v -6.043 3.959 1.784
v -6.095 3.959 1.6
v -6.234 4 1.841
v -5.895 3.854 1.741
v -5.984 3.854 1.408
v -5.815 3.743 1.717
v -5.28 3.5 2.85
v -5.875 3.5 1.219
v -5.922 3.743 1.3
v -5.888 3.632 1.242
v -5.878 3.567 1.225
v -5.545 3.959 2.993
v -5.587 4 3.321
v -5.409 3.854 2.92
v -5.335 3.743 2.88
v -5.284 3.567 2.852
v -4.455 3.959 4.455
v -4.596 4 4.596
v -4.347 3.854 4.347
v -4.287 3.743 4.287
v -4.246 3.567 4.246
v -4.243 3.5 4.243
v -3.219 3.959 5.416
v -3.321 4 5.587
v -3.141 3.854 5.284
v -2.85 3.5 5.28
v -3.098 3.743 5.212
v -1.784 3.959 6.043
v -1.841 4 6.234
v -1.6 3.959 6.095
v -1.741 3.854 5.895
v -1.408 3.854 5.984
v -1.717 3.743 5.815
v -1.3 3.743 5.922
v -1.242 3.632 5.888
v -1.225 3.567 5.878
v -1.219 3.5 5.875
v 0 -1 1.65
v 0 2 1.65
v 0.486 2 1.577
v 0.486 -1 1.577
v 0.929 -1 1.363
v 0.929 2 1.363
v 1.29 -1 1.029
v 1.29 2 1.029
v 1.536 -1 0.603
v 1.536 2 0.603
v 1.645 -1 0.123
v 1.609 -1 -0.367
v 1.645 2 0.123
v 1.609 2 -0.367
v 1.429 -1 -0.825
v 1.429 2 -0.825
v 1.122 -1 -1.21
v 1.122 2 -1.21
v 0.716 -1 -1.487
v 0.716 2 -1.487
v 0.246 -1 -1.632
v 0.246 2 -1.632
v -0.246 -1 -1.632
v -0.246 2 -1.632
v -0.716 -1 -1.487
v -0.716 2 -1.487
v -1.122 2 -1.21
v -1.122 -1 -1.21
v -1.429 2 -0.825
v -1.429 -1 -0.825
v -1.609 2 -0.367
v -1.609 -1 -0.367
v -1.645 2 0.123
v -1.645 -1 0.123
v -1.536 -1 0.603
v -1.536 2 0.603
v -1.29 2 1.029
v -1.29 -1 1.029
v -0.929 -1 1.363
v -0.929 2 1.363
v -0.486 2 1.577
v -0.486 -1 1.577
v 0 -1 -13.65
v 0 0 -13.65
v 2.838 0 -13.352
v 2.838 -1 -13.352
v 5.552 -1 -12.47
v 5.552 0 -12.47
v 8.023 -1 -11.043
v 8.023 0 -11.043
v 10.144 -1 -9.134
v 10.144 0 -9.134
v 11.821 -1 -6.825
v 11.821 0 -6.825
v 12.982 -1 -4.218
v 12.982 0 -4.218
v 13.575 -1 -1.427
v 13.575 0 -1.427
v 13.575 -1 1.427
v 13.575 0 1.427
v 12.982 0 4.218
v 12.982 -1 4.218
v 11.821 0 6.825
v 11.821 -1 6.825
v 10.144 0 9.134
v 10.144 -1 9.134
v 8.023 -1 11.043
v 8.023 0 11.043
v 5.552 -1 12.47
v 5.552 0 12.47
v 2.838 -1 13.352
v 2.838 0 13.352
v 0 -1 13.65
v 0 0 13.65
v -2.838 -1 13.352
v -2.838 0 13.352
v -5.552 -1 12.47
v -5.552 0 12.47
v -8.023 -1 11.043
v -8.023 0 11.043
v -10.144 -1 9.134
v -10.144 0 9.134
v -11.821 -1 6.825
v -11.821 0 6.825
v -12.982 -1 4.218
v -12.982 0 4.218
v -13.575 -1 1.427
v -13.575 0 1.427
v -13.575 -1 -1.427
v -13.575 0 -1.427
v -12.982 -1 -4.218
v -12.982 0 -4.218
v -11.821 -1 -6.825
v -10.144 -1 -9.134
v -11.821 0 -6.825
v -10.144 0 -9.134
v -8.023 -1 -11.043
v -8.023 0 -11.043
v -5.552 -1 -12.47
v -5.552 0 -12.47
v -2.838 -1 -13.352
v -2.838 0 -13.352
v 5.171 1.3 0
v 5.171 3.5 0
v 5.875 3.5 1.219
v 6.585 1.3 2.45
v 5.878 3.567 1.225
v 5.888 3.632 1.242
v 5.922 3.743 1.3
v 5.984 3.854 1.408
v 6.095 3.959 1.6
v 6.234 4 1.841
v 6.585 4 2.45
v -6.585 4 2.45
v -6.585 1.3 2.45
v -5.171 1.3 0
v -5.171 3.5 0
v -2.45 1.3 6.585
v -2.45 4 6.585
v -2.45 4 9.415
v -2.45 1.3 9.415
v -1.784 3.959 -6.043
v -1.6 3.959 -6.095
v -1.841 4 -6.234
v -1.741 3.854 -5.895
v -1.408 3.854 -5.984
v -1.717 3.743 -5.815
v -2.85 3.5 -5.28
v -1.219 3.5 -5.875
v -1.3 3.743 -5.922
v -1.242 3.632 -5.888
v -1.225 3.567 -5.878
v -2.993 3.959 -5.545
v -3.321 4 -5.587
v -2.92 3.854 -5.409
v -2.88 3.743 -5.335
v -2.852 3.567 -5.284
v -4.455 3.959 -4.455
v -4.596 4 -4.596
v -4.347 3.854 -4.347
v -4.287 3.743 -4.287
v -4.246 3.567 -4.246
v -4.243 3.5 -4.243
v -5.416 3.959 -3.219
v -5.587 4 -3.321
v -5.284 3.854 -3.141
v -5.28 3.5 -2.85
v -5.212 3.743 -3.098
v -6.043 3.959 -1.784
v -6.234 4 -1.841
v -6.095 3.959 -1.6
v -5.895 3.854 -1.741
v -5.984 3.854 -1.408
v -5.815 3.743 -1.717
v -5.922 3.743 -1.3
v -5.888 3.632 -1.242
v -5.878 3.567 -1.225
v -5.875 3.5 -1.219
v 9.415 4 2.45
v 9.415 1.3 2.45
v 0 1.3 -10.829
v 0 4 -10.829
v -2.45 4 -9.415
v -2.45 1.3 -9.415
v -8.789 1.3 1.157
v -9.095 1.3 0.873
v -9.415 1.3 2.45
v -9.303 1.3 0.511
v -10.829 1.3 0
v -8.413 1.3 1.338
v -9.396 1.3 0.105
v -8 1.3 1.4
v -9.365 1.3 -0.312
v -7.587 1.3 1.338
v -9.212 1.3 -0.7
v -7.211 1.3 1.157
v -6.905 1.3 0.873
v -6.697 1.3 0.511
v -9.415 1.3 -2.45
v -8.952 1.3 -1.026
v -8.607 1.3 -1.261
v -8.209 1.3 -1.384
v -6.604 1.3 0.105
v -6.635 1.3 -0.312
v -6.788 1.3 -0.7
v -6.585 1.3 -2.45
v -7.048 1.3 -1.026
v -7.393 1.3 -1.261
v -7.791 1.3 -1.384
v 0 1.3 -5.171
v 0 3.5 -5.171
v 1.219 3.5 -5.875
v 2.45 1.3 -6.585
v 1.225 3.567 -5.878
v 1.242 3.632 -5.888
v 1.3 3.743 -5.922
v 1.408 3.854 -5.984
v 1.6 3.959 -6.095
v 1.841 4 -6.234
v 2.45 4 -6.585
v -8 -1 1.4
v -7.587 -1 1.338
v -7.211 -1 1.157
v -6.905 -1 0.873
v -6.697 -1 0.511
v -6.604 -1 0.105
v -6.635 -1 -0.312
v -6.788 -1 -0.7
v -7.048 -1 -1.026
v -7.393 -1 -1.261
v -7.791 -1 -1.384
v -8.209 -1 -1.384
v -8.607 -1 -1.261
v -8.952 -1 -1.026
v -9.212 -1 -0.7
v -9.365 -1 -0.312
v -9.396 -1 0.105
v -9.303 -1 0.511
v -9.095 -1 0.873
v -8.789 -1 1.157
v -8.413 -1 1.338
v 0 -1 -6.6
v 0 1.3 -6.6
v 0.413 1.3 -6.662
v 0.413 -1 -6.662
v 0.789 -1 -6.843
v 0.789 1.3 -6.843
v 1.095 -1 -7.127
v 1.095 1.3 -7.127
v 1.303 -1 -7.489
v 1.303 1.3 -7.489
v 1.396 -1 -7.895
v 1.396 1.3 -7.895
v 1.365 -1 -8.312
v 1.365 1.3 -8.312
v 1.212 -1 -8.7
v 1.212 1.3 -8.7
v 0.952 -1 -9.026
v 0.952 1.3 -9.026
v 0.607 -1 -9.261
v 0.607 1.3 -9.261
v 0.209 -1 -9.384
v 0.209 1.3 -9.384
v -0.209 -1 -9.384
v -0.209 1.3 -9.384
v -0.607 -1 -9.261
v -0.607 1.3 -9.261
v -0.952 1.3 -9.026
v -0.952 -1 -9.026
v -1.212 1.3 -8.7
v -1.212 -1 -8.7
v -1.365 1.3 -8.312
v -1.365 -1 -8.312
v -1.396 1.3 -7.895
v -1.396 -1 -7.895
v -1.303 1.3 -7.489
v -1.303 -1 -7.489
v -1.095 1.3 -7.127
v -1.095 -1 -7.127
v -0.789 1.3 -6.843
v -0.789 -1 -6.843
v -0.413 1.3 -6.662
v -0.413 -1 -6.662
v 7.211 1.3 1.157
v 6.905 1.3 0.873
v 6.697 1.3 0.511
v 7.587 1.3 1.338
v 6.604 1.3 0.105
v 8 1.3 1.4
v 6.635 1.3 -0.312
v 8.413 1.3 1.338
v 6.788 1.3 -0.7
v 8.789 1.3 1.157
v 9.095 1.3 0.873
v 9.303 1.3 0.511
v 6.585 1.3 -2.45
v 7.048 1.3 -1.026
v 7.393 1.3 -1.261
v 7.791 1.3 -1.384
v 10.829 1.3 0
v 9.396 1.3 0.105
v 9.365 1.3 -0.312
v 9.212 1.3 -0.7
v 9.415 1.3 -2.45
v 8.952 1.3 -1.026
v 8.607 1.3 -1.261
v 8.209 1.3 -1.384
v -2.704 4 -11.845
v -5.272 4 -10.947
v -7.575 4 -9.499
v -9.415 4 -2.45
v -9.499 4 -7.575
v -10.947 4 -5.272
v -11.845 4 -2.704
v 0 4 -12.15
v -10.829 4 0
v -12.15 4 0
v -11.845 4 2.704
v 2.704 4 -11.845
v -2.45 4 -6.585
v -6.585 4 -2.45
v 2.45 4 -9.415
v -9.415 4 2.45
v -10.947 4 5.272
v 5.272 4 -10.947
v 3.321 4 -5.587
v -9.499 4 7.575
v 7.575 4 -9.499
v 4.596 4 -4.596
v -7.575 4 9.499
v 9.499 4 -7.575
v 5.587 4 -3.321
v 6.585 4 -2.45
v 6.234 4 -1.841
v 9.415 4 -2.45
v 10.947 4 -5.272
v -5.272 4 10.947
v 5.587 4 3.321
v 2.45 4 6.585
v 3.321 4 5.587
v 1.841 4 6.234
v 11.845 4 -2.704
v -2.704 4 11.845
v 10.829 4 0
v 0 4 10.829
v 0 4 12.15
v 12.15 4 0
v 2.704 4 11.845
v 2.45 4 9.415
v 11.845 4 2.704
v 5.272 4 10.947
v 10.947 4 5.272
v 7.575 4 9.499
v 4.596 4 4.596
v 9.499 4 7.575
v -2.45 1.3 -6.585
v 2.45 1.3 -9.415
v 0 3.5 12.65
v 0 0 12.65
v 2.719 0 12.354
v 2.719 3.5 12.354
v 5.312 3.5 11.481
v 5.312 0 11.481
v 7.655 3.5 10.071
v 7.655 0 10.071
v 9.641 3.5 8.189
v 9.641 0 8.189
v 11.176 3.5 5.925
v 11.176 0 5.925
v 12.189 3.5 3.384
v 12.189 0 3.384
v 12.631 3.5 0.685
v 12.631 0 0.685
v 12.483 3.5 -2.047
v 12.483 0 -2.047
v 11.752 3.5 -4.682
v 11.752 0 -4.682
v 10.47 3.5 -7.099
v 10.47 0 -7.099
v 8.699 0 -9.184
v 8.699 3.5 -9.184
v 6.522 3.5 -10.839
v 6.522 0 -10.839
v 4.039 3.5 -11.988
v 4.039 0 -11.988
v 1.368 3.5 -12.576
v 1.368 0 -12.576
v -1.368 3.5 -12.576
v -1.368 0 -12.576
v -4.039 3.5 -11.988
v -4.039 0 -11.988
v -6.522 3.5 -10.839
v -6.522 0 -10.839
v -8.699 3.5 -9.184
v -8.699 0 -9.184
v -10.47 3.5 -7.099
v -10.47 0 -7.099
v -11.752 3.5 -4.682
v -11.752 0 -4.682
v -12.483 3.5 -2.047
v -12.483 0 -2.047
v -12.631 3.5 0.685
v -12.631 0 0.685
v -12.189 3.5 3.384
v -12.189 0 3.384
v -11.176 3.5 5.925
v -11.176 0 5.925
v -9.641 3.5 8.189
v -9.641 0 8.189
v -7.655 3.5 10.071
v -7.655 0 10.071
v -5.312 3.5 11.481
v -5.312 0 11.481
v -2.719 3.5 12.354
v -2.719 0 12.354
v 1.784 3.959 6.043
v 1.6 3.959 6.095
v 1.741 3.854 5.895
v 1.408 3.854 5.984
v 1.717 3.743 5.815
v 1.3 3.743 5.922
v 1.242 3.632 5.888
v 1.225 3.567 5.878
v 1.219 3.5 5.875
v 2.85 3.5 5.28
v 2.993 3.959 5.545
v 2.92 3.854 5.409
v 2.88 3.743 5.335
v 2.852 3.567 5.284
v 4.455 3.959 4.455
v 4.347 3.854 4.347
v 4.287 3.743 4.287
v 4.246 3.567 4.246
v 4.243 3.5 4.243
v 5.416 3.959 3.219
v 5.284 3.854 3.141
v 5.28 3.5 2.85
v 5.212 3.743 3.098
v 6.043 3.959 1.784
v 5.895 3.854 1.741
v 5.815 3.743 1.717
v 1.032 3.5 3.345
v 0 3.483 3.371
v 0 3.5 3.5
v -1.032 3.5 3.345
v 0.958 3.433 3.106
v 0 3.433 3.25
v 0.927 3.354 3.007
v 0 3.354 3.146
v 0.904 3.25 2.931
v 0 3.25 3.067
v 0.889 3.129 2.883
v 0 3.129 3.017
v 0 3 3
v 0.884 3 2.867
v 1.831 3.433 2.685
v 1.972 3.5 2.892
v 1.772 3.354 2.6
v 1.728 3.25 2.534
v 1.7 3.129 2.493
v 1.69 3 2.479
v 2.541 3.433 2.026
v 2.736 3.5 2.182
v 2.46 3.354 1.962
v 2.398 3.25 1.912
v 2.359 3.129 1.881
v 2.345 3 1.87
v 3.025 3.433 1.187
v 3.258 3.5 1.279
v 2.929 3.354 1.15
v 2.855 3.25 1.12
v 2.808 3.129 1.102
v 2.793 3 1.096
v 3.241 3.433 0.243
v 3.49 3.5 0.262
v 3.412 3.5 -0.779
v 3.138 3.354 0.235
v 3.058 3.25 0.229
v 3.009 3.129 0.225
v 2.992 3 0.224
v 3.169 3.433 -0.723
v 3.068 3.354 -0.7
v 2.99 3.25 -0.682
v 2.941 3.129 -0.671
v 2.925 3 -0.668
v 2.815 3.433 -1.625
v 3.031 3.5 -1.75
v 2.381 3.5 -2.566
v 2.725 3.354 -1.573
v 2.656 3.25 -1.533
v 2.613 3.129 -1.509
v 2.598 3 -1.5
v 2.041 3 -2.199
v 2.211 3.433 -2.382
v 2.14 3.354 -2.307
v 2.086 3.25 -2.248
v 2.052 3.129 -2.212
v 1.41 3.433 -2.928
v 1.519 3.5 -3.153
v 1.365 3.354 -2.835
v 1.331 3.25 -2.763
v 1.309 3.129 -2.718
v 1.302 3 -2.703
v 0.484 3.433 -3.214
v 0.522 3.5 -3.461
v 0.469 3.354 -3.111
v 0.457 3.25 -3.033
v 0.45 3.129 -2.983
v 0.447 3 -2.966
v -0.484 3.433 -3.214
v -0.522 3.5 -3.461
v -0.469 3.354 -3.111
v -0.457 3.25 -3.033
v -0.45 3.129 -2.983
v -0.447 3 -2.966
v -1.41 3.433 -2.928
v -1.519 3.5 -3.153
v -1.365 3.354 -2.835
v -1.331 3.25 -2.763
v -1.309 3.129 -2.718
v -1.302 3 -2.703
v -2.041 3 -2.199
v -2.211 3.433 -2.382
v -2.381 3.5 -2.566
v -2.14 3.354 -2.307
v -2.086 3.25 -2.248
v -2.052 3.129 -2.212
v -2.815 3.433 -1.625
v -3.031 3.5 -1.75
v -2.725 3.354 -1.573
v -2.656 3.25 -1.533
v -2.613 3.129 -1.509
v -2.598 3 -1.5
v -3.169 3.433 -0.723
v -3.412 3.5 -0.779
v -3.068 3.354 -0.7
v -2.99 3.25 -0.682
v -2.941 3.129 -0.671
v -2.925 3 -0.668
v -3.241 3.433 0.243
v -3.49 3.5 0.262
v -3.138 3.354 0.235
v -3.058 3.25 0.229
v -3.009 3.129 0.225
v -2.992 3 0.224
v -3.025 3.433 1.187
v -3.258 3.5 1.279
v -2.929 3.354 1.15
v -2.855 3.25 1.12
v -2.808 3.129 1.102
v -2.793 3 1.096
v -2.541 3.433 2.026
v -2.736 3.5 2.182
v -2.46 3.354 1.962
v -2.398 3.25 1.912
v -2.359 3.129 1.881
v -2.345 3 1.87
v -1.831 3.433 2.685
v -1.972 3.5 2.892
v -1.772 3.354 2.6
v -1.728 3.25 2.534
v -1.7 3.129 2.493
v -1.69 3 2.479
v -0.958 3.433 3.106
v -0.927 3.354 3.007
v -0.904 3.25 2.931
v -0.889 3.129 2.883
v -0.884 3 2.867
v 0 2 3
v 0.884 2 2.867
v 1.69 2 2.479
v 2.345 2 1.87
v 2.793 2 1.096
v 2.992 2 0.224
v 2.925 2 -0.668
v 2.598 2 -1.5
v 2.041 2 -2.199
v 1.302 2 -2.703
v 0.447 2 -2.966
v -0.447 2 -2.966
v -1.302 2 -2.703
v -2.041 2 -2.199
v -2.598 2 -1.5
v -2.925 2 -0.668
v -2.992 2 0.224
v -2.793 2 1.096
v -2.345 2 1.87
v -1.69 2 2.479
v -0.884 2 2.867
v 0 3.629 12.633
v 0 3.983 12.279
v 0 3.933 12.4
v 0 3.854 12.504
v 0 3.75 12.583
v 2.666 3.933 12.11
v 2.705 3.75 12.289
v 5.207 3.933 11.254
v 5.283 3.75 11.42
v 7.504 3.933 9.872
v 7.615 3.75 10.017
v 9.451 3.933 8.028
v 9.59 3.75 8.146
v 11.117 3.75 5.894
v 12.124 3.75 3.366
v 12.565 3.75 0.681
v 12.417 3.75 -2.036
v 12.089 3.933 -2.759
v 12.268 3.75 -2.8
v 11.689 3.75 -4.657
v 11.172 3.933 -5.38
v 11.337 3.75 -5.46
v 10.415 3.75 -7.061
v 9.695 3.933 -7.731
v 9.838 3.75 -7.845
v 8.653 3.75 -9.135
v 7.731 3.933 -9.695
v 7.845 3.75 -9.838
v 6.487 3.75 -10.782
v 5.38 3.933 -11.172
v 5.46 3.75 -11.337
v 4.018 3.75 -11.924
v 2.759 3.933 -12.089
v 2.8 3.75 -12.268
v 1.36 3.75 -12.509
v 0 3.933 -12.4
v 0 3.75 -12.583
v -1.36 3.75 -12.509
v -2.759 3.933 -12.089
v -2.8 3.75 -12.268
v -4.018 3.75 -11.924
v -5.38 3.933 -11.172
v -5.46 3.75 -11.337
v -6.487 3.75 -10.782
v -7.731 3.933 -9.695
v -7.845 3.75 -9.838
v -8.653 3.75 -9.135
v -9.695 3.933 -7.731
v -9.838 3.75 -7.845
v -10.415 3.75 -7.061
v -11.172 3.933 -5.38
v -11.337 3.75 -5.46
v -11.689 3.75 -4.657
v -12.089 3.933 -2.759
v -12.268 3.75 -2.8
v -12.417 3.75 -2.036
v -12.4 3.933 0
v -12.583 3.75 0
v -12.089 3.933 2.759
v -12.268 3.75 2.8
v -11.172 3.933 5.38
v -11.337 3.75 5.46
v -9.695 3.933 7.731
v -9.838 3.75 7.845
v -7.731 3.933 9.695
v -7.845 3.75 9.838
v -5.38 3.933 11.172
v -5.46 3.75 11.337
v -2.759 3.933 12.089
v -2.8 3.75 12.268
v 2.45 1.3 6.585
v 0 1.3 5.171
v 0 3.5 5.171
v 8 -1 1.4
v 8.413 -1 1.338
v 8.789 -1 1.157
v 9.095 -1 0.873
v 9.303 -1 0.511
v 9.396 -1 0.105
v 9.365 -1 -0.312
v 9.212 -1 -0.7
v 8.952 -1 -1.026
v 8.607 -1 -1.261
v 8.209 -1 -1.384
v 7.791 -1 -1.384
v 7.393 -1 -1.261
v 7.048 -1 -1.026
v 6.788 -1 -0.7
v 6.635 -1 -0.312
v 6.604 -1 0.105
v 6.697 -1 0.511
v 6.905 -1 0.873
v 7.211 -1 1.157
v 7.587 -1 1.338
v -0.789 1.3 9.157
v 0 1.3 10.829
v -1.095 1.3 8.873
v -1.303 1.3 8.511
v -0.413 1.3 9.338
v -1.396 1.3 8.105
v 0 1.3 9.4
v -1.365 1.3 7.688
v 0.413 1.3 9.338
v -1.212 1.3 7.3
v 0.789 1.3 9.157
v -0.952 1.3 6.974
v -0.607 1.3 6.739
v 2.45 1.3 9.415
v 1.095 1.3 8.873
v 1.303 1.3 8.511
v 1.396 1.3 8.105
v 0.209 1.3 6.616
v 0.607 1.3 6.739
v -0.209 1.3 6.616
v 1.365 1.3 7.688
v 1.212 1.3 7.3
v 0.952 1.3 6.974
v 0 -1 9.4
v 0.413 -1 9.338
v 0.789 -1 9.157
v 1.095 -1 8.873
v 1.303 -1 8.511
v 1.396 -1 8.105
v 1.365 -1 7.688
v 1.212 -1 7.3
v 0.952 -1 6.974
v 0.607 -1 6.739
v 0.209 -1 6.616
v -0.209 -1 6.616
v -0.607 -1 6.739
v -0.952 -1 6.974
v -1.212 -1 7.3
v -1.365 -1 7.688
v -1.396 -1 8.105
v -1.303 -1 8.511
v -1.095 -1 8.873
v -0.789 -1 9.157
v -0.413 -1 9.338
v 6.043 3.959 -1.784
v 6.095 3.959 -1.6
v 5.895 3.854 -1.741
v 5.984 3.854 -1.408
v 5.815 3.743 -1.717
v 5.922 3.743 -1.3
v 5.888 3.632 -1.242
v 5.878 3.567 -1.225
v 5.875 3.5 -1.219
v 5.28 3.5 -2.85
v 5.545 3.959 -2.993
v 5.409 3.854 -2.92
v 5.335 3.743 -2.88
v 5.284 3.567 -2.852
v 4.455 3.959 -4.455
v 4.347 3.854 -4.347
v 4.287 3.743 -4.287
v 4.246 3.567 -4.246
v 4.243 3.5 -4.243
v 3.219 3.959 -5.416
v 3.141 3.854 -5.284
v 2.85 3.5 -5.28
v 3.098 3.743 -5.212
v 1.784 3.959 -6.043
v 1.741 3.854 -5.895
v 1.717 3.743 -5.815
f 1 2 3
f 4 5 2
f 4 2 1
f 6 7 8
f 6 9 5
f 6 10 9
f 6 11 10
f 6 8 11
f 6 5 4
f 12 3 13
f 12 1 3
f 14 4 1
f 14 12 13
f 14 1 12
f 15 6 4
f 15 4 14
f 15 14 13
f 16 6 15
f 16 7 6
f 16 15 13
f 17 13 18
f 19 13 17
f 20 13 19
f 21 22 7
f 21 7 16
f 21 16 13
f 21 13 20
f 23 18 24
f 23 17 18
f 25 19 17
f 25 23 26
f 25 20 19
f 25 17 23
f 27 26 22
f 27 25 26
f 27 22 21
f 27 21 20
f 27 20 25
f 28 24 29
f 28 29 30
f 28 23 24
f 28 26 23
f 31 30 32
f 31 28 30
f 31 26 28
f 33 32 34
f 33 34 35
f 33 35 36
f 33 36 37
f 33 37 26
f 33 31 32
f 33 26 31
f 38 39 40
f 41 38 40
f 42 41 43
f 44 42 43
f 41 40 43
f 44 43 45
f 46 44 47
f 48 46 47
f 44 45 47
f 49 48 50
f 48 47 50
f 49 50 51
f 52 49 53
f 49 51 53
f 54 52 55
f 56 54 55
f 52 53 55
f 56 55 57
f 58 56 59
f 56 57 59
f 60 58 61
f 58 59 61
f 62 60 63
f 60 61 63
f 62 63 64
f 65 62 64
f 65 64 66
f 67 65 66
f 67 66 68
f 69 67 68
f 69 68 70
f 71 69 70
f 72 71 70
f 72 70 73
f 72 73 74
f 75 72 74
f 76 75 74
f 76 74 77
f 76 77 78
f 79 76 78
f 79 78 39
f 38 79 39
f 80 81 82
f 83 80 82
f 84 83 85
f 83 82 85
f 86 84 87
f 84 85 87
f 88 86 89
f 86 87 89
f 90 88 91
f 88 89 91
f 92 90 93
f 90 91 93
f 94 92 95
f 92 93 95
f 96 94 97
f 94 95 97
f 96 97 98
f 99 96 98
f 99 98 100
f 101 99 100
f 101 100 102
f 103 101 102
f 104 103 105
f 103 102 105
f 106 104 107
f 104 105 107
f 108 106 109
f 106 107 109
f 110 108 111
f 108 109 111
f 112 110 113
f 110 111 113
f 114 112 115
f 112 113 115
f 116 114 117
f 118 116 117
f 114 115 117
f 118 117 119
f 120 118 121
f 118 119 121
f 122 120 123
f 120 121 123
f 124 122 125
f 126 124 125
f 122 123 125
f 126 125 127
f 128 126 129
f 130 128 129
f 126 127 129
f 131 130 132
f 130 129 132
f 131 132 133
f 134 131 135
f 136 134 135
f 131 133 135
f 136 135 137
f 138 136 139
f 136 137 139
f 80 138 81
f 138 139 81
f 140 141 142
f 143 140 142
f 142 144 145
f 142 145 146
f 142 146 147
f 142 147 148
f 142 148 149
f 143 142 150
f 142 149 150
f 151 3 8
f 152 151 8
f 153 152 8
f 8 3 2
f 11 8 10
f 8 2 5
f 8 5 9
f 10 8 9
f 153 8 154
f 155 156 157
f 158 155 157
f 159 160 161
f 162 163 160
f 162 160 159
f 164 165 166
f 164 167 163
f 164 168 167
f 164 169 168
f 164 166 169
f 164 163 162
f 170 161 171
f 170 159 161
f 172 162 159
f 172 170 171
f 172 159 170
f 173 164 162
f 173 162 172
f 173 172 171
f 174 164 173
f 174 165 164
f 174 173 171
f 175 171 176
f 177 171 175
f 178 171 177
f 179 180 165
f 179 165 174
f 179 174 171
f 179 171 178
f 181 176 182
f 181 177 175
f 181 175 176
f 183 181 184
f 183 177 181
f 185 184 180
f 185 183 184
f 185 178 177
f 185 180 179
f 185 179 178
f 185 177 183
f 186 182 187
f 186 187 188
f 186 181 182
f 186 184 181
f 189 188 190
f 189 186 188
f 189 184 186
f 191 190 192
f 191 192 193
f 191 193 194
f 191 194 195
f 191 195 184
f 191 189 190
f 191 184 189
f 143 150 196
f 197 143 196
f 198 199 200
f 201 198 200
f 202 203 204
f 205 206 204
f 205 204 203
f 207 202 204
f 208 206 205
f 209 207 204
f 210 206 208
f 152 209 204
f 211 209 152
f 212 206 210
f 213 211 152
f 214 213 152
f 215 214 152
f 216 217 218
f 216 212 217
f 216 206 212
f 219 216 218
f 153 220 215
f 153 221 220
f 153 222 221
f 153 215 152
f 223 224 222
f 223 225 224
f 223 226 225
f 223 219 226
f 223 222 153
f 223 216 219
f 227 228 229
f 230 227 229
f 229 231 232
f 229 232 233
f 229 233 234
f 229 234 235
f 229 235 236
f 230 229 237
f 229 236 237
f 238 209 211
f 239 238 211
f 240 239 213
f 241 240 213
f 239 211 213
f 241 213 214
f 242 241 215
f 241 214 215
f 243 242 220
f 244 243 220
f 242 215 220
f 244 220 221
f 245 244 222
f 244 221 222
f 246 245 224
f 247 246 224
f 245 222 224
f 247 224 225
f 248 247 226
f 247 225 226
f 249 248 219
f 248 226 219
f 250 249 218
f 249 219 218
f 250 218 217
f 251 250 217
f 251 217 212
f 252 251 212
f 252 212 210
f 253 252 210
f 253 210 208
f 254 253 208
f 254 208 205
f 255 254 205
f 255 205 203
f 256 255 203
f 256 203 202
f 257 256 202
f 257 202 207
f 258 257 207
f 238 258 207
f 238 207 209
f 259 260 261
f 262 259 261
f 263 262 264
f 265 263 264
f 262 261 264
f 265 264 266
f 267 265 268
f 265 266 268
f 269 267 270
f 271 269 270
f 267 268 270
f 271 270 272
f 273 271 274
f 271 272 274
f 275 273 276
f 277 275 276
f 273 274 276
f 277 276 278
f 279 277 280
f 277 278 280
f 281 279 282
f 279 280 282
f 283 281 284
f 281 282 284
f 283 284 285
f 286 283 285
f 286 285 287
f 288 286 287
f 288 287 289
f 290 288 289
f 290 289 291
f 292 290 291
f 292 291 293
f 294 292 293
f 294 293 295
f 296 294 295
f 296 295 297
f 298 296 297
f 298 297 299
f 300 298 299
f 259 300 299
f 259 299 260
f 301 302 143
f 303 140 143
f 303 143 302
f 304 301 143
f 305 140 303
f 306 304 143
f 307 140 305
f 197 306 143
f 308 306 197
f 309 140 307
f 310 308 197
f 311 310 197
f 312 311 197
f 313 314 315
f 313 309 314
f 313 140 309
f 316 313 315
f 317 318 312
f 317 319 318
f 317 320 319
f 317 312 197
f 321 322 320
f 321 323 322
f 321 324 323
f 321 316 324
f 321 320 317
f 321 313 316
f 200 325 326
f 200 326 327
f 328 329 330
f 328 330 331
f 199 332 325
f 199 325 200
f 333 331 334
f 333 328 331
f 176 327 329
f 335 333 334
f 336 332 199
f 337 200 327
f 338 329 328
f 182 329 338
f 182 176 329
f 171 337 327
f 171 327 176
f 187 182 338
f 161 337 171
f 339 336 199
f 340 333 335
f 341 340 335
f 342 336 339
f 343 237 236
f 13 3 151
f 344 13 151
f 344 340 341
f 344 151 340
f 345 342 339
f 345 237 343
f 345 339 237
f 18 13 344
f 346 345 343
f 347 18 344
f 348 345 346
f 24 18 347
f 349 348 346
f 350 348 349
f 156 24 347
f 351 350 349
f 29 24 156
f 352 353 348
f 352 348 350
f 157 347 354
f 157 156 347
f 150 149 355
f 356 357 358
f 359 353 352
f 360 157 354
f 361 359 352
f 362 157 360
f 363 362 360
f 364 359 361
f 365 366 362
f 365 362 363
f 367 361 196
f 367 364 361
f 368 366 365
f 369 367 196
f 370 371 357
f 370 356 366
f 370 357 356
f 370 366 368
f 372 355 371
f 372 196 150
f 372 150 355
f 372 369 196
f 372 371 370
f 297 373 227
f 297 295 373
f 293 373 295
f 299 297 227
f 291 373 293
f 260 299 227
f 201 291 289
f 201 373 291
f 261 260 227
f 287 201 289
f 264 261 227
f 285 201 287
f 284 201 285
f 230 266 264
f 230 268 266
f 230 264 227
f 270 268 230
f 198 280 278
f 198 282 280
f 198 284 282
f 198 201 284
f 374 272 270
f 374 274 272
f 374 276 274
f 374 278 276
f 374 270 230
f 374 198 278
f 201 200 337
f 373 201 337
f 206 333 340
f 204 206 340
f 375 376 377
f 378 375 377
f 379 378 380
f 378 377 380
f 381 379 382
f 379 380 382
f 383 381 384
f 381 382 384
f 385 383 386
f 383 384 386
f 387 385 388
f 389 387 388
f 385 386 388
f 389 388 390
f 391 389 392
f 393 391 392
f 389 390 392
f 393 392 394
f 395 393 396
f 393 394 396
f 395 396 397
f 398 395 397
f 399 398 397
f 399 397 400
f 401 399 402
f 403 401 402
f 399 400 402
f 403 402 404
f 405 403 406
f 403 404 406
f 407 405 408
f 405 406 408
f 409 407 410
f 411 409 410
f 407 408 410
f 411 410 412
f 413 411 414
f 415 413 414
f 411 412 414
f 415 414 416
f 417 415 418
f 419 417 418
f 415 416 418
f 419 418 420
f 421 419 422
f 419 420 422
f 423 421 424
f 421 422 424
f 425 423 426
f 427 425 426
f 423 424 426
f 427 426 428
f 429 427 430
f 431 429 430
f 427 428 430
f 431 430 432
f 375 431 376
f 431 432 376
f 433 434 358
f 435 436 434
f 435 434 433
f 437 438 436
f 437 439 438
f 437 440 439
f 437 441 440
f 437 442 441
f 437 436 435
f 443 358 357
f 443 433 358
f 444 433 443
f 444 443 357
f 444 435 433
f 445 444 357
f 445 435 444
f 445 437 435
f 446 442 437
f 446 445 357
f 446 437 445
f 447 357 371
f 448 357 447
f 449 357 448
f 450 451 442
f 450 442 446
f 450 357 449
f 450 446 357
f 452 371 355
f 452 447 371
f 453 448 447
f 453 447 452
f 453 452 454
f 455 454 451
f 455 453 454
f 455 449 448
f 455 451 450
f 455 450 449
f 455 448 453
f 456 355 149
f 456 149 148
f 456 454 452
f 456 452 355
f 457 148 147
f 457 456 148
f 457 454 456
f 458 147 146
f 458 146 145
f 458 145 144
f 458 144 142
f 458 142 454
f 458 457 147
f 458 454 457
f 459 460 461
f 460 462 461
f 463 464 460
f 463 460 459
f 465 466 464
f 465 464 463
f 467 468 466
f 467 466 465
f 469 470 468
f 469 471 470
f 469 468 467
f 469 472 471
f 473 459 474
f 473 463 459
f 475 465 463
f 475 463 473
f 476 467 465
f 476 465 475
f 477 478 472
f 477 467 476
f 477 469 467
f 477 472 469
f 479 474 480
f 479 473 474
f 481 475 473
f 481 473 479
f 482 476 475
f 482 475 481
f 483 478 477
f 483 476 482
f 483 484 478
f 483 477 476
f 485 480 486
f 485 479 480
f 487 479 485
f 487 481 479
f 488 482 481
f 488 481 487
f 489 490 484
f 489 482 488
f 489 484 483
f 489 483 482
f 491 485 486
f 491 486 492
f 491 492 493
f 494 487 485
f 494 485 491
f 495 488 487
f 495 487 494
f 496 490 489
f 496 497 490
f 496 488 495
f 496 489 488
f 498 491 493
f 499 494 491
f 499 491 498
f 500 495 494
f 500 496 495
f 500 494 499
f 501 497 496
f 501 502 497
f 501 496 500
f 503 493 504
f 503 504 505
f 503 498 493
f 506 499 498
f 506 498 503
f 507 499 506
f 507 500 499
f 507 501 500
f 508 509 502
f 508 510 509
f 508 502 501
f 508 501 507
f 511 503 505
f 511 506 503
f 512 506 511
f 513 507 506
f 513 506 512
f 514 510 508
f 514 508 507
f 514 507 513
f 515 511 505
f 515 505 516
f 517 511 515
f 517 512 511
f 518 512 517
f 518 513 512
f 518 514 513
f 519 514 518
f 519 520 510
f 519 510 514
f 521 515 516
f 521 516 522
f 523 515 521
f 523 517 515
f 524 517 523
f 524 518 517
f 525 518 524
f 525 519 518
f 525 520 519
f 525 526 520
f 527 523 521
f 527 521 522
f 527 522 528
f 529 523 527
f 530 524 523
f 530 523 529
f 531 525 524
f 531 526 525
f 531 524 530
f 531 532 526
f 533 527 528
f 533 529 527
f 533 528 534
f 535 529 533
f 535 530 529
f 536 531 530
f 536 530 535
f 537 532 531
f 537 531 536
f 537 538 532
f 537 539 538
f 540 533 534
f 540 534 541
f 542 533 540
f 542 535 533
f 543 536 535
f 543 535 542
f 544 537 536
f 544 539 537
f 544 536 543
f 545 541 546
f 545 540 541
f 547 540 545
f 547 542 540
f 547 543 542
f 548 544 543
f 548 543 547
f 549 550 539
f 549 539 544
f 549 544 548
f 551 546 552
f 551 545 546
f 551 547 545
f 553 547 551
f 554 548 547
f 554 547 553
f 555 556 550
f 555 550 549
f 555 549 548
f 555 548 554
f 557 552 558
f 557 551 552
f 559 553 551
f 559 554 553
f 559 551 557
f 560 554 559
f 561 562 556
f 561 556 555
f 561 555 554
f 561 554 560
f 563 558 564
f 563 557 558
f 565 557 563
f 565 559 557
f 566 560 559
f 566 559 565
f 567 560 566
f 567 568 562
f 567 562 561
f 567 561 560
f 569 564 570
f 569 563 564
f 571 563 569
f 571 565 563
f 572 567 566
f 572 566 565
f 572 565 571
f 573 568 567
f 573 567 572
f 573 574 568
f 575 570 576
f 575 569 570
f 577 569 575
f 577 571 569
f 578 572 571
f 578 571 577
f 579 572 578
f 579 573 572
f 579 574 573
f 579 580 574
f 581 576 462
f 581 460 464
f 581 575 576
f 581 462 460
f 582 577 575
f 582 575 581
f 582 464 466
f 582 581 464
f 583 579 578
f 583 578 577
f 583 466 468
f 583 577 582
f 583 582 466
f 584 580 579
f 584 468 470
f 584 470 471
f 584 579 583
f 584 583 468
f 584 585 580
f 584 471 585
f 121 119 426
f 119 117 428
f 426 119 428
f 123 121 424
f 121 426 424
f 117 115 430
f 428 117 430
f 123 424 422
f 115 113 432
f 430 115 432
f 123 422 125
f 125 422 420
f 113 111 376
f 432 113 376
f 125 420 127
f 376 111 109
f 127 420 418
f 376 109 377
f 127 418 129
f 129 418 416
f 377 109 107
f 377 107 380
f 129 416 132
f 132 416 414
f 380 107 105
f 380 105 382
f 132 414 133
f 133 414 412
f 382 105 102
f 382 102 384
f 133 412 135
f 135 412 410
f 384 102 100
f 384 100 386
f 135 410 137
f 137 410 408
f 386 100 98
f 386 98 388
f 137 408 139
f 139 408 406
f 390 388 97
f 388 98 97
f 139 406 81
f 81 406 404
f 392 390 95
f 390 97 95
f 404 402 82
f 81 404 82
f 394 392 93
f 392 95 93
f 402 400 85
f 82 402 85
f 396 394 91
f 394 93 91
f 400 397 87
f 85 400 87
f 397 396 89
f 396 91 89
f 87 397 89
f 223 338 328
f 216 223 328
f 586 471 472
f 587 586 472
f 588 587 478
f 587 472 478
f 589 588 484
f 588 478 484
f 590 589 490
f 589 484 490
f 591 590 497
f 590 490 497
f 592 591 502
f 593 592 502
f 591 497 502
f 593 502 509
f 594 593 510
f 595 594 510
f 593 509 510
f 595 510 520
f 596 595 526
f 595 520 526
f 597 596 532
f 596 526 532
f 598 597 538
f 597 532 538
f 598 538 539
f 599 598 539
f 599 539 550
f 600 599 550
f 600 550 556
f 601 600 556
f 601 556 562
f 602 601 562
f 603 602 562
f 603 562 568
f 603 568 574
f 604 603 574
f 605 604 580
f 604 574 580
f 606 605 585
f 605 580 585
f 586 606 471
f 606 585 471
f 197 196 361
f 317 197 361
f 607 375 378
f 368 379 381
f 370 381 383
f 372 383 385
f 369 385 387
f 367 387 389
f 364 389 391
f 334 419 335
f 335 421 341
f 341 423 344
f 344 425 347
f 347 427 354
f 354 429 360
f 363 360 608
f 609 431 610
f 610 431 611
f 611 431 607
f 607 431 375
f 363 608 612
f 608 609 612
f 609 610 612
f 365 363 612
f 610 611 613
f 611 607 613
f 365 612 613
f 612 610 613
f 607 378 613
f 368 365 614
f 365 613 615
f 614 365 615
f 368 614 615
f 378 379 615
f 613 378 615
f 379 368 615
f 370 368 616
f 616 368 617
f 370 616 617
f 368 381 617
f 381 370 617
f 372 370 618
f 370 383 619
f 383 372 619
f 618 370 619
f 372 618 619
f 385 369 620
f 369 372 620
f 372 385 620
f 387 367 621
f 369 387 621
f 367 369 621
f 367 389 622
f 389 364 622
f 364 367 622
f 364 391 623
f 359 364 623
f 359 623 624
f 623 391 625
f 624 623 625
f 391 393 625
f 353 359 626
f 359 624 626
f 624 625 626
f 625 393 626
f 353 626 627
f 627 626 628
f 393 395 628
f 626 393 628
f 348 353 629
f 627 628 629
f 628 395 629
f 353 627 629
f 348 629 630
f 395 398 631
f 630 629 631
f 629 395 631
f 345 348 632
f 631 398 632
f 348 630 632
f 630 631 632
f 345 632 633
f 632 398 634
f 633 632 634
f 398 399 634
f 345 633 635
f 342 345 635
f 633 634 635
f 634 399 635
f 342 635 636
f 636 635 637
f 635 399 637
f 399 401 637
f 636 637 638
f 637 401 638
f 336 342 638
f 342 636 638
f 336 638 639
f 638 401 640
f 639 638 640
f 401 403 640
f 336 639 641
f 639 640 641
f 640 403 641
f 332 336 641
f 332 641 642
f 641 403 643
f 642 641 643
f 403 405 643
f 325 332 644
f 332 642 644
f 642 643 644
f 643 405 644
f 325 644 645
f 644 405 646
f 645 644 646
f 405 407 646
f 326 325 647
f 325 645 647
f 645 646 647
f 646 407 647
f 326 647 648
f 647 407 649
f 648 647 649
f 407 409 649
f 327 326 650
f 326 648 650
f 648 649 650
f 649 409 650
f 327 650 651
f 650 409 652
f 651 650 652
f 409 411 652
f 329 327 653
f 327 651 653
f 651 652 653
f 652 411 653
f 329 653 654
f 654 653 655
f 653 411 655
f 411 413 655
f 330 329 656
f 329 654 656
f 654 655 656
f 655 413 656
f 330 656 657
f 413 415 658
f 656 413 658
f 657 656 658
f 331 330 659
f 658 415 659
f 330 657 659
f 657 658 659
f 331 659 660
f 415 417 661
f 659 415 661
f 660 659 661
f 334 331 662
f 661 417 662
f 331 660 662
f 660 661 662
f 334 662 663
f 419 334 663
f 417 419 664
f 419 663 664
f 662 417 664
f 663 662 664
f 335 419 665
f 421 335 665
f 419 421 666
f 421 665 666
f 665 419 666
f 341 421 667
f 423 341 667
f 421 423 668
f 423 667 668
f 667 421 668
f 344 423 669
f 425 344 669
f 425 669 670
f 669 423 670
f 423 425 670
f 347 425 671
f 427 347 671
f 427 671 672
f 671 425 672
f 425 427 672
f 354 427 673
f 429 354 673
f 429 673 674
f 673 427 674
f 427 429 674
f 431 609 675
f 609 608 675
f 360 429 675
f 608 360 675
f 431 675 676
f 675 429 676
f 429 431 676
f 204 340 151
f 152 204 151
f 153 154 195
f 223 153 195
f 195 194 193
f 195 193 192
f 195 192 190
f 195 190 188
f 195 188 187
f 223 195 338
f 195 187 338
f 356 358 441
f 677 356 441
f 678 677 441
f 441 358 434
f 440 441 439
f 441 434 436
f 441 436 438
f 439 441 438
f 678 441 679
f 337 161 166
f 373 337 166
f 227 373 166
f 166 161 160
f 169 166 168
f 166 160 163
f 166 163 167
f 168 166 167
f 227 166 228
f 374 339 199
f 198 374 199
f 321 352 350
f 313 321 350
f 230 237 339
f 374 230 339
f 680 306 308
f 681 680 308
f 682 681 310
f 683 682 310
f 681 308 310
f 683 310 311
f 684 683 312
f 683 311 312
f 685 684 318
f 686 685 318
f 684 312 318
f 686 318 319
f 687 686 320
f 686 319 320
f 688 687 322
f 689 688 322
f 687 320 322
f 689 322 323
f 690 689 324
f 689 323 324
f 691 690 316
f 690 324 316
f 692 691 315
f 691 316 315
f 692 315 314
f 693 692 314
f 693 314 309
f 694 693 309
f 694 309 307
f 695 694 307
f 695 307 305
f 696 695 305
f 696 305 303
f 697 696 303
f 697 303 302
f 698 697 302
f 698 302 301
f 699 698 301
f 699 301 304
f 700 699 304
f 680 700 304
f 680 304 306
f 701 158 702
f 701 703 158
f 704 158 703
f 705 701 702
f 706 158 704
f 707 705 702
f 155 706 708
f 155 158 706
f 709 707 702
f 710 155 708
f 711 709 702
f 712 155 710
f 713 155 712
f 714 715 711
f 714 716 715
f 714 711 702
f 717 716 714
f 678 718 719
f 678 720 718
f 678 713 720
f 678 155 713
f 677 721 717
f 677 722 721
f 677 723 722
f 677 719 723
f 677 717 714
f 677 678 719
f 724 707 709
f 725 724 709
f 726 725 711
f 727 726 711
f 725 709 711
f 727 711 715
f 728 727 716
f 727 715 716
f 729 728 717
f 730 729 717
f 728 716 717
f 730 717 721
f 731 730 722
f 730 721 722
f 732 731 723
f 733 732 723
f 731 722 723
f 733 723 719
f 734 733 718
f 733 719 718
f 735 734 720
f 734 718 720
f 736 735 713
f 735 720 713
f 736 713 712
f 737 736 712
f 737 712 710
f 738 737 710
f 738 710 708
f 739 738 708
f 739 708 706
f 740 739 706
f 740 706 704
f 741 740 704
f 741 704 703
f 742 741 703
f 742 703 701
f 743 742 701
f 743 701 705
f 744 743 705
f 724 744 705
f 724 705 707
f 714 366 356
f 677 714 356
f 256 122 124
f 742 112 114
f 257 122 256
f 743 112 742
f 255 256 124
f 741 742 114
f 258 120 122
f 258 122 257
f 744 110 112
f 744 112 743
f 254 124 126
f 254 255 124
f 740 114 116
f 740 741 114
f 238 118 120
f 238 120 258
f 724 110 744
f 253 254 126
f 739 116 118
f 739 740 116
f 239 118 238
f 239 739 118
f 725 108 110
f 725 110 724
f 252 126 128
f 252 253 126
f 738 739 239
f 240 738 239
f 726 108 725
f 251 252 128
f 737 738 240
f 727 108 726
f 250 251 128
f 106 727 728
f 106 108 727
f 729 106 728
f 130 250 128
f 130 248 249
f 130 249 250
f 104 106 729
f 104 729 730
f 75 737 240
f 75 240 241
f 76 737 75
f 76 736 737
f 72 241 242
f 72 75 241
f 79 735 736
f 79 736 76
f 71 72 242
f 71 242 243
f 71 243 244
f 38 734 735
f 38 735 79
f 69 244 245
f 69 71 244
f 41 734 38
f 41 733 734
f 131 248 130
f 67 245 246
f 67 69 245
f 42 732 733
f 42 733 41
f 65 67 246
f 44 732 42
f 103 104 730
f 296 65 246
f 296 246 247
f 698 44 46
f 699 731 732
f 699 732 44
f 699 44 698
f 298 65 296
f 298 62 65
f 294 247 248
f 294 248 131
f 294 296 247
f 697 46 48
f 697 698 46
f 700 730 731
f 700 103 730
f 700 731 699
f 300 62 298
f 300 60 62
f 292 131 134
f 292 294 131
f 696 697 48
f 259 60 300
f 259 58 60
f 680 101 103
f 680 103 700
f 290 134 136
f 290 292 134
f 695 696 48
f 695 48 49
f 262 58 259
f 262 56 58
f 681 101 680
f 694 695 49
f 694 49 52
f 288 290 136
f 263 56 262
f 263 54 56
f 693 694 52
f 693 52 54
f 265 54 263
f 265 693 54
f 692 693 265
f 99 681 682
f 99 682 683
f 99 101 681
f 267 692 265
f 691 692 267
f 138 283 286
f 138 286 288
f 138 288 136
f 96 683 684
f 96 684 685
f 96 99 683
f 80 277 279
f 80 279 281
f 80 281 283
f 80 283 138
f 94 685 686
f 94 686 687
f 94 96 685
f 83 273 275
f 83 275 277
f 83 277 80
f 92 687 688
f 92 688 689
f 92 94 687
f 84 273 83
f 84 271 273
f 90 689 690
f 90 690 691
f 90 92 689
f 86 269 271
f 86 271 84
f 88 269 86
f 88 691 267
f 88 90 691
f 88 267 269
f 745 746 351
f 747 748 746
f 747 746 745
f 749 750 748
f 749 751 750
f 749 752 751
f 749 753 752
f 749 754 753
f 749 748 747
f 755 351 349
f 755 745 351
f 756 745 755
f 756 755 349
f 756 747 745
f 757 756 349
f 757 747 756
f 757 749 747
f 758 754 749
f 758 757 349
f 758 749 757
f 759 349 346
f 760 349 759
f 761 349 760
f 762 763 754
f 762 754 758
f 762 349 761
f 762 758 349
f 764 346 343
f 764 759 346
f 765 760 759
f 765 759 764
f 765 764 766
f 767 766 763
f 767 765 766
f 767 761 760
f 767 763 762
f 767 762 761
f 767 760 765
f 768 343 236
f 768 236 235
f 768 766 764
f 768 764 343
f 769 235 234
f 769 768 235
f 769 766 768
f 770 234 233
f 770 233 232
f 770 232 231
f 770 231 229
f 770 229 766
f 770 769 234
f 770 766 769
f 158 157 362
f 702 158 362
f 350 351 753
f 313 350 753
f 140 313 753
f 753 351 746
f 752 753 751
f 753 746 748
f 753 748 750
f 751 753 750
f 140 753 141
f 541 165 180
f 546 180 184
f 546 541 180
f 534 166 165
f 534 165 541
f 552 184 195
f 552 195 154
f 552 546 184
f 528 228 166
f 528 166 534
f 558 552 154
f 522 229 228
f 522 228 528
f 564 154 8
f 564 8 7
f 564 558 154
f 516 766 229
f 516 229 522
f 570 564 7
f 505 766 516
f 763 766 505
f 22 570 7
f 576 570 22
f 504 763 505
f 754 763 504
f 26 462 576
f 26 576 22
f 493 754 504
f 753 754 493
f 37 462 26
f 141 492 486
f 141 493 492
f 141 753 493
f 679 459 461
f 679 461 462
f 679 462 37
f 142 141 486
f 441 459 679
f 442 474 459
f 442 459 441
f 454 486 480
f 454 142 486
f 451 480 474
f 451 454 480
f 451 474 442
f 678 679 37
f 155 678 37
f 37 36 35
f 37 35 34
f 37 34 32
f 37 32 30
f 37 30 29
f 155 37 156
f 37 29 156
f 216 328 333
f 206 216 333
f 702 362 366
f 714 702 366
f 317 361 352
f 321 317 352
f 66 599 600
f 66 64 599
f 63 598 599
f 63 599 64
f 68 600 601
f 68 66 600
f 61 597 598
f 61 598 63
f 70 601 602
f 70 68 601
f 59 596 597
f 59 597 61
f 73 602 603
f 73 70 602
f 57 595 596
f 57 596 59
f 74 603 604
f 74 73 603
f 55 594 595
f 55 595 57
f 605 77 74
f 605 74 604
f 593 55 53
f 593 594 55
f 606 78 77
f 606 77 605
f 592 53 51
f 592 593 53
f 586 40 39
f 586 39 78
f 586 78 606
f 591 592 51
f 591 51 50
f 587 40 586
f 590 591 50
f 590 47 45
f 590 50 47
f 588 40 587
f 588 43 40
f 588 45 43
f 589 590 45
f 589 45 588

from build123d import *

# Parameters (mm, degrees)
SKETCH1_R           = 12.65
BOSS_EXTRUDE1_DEPTH = 4
SKETCH4_R           = 6
CUT_EXTRUDE3_DEPTH  = 0.5
SKETCH5_R           = 3
CUT_EXTRUDE4_DEPTH  = 1.5
FILLET1_R           = 0.5
FILLET2_R           = 0.5
FILLET3_R           = 0.5
SKETCH7_R           = 13.65
BOSS_EXTRUDE2_DEPTH = 1
SKETCH8_R           = 1.4
CUT_EXTRUDE6_DEPTH  = 20.941038087
CUT_EXTRUDE7_DEPTH  = 2.7
SKETCH16_R          = 1.65
CUT_EXTRUDE8_DEPTH  = 10


with BuildPart() as part:
    # Sketch1 → Boss-Extrude1 (new body)
    with BuildSketch(Plane(origin=(0, 0, 0), x_dir=(1, 0, 0), z_dir=(0, 1, 0))):
        with Locations(Location((0, 0, 0), (0, 0, 270))):
            Circle(SKETCH1_R)
    extrude(amount=BOSS_EXTRUDE1_DEPTH)

    # Sketch4 → Cut-Extrude3 (cut)
    with BuildSketch(Plane(origin=(0, 4, 0), x_dir=(1, 0, 0), z_dir=(0, 1, 0))):
        with Locations(Location((0, 0, 0), (0, 0, 270))):
            Circle(SKETCH4_R)
    extrude(amount=-CUT_EXTRUDE3_DEPTH, mode=Mode.SUBTRACT)

    # Sketch5 → Cut-Extrude4 (cut)
    with BuildSketch(Plane(origin=(0, 3.5, 0), x_dir=(1, 0, 0), z_dir=(0, 1, 0))):
        with Locations(Location((0, 0, 0), (0, 0, 270))):
            Circle(SKETCH5_R)
    extrude(amount=-CUT_EXTRUDE4_DEPTH, mode=Mode.SUBTRACT)

    # Fillet1
    fillet1_edges = [part.edges().sort_by_distance(p)[0] for p in [
        (0, 4, -6),
    ]]
    fillet(fillet1_edges, radius=FILLET1_R - 0.0001)  # a hair under: the kernel refuses the full size

    # Fillet2
    fillet2_edges = [part.edges().sort_by_distance(p)[0] for p in [
        (0, 3.5, -3),
    ]]
    fillet(fillet2_edges, radius=FILLET2_R)

    # Fillet3
    fillet3_edges = [part.edges().sort_by_distance(p)[0] for p in [
        (0, 4, -12.65),
    ]]
    fillet(fillet3_edges, radius=FILLET3_R)

    # Sketch7 → Boss-Extrude2 (add)
    with BuildSketch(Plane.XZ):
        with Locations(Location((0, 0, 0), (0, 0, 270))):
            Circle(SKETCH7_R)
    extrude(amount=BOSS_EXTRUDE2_DEPTH)

    # Sketch8 → Cut-Extrude6 (cut, through all)
    with BuildSketch(Plane(origin=(0, 4, 0), x_dir=(1, 0, 0), z_dir=(0, 1, 0))):
        with Locations(Location((0, 8, 0), (0, 0, 270))):
            Circle(SKETCH8_R)
        with Locations(Location((8, 0, 0), (0, 0, 270))):
            Circle(SKETCH8_R)
        with Locations(Location((0, -8, 0), (0, 0, 270))):
            Circle(SKETCH8_R)
        with Locations(Location((-8, 0, 0), (0, 0, 270))):
            Circle(SKETCH8_R)
    extrude(amount=-CUT_EXTRUDE6_DEPTH, mode=Mode.SUBTRACT)

    # Sketch15 → Cut-Extrude7 (cut)
    with BuildSketch(Plane(origin=(0, 4, 0), x_dir=(1, 0, 0), z_dir=(0, 1, 0))):
        Polygon((5.170983681, 0), (6.58549184, -2.45), (9.41450816, -2.45), (10.829016319, 0), (9.41450816, 2.45), (6.58549184, 2.45), align=None)
        Polygon((0, 5.170983681), (2.45, 6.58549184), (2.45, 9.41450816), (0, 10.829016319), (-2.45, 9.41450816), (-2.45, 6.58549184), align=None)
        Polygon((0, -5.170983681), (-2.45, -6.58549184), (-2.45, -9.41450816), (0, -10.829016319), (2.45, -9.41450816), (2.45, -6.58549184), align=None)
        Polygon((-5.170983681, 0), (-6.58549184, 2.45), (-9.41450816, 2.45), (-10.829016319, 0), (-9.41450816, -2.45), (-6.58549184, -2.45), align=None)
    extrude(amount=-CUT_EXTRUDE7_DEPTH, mode=Mode.SUBTRACT)

    # Sketch16 → Cut-Extrude8 (cut)
    with BuildSketch(Plane(origin=(0, 2, 0), x_dir=(1, 0, 0), z_dir=(0, 1, 0))):
        with Locations(Location((0, 0, 0), (0, 0, 270))):
            Circle(SKETCH16_R)
    extrude(amount=-CUT_EXTRUDE8_DEPTH, mode=Mode.SUBTRACT)


solid = part.part
